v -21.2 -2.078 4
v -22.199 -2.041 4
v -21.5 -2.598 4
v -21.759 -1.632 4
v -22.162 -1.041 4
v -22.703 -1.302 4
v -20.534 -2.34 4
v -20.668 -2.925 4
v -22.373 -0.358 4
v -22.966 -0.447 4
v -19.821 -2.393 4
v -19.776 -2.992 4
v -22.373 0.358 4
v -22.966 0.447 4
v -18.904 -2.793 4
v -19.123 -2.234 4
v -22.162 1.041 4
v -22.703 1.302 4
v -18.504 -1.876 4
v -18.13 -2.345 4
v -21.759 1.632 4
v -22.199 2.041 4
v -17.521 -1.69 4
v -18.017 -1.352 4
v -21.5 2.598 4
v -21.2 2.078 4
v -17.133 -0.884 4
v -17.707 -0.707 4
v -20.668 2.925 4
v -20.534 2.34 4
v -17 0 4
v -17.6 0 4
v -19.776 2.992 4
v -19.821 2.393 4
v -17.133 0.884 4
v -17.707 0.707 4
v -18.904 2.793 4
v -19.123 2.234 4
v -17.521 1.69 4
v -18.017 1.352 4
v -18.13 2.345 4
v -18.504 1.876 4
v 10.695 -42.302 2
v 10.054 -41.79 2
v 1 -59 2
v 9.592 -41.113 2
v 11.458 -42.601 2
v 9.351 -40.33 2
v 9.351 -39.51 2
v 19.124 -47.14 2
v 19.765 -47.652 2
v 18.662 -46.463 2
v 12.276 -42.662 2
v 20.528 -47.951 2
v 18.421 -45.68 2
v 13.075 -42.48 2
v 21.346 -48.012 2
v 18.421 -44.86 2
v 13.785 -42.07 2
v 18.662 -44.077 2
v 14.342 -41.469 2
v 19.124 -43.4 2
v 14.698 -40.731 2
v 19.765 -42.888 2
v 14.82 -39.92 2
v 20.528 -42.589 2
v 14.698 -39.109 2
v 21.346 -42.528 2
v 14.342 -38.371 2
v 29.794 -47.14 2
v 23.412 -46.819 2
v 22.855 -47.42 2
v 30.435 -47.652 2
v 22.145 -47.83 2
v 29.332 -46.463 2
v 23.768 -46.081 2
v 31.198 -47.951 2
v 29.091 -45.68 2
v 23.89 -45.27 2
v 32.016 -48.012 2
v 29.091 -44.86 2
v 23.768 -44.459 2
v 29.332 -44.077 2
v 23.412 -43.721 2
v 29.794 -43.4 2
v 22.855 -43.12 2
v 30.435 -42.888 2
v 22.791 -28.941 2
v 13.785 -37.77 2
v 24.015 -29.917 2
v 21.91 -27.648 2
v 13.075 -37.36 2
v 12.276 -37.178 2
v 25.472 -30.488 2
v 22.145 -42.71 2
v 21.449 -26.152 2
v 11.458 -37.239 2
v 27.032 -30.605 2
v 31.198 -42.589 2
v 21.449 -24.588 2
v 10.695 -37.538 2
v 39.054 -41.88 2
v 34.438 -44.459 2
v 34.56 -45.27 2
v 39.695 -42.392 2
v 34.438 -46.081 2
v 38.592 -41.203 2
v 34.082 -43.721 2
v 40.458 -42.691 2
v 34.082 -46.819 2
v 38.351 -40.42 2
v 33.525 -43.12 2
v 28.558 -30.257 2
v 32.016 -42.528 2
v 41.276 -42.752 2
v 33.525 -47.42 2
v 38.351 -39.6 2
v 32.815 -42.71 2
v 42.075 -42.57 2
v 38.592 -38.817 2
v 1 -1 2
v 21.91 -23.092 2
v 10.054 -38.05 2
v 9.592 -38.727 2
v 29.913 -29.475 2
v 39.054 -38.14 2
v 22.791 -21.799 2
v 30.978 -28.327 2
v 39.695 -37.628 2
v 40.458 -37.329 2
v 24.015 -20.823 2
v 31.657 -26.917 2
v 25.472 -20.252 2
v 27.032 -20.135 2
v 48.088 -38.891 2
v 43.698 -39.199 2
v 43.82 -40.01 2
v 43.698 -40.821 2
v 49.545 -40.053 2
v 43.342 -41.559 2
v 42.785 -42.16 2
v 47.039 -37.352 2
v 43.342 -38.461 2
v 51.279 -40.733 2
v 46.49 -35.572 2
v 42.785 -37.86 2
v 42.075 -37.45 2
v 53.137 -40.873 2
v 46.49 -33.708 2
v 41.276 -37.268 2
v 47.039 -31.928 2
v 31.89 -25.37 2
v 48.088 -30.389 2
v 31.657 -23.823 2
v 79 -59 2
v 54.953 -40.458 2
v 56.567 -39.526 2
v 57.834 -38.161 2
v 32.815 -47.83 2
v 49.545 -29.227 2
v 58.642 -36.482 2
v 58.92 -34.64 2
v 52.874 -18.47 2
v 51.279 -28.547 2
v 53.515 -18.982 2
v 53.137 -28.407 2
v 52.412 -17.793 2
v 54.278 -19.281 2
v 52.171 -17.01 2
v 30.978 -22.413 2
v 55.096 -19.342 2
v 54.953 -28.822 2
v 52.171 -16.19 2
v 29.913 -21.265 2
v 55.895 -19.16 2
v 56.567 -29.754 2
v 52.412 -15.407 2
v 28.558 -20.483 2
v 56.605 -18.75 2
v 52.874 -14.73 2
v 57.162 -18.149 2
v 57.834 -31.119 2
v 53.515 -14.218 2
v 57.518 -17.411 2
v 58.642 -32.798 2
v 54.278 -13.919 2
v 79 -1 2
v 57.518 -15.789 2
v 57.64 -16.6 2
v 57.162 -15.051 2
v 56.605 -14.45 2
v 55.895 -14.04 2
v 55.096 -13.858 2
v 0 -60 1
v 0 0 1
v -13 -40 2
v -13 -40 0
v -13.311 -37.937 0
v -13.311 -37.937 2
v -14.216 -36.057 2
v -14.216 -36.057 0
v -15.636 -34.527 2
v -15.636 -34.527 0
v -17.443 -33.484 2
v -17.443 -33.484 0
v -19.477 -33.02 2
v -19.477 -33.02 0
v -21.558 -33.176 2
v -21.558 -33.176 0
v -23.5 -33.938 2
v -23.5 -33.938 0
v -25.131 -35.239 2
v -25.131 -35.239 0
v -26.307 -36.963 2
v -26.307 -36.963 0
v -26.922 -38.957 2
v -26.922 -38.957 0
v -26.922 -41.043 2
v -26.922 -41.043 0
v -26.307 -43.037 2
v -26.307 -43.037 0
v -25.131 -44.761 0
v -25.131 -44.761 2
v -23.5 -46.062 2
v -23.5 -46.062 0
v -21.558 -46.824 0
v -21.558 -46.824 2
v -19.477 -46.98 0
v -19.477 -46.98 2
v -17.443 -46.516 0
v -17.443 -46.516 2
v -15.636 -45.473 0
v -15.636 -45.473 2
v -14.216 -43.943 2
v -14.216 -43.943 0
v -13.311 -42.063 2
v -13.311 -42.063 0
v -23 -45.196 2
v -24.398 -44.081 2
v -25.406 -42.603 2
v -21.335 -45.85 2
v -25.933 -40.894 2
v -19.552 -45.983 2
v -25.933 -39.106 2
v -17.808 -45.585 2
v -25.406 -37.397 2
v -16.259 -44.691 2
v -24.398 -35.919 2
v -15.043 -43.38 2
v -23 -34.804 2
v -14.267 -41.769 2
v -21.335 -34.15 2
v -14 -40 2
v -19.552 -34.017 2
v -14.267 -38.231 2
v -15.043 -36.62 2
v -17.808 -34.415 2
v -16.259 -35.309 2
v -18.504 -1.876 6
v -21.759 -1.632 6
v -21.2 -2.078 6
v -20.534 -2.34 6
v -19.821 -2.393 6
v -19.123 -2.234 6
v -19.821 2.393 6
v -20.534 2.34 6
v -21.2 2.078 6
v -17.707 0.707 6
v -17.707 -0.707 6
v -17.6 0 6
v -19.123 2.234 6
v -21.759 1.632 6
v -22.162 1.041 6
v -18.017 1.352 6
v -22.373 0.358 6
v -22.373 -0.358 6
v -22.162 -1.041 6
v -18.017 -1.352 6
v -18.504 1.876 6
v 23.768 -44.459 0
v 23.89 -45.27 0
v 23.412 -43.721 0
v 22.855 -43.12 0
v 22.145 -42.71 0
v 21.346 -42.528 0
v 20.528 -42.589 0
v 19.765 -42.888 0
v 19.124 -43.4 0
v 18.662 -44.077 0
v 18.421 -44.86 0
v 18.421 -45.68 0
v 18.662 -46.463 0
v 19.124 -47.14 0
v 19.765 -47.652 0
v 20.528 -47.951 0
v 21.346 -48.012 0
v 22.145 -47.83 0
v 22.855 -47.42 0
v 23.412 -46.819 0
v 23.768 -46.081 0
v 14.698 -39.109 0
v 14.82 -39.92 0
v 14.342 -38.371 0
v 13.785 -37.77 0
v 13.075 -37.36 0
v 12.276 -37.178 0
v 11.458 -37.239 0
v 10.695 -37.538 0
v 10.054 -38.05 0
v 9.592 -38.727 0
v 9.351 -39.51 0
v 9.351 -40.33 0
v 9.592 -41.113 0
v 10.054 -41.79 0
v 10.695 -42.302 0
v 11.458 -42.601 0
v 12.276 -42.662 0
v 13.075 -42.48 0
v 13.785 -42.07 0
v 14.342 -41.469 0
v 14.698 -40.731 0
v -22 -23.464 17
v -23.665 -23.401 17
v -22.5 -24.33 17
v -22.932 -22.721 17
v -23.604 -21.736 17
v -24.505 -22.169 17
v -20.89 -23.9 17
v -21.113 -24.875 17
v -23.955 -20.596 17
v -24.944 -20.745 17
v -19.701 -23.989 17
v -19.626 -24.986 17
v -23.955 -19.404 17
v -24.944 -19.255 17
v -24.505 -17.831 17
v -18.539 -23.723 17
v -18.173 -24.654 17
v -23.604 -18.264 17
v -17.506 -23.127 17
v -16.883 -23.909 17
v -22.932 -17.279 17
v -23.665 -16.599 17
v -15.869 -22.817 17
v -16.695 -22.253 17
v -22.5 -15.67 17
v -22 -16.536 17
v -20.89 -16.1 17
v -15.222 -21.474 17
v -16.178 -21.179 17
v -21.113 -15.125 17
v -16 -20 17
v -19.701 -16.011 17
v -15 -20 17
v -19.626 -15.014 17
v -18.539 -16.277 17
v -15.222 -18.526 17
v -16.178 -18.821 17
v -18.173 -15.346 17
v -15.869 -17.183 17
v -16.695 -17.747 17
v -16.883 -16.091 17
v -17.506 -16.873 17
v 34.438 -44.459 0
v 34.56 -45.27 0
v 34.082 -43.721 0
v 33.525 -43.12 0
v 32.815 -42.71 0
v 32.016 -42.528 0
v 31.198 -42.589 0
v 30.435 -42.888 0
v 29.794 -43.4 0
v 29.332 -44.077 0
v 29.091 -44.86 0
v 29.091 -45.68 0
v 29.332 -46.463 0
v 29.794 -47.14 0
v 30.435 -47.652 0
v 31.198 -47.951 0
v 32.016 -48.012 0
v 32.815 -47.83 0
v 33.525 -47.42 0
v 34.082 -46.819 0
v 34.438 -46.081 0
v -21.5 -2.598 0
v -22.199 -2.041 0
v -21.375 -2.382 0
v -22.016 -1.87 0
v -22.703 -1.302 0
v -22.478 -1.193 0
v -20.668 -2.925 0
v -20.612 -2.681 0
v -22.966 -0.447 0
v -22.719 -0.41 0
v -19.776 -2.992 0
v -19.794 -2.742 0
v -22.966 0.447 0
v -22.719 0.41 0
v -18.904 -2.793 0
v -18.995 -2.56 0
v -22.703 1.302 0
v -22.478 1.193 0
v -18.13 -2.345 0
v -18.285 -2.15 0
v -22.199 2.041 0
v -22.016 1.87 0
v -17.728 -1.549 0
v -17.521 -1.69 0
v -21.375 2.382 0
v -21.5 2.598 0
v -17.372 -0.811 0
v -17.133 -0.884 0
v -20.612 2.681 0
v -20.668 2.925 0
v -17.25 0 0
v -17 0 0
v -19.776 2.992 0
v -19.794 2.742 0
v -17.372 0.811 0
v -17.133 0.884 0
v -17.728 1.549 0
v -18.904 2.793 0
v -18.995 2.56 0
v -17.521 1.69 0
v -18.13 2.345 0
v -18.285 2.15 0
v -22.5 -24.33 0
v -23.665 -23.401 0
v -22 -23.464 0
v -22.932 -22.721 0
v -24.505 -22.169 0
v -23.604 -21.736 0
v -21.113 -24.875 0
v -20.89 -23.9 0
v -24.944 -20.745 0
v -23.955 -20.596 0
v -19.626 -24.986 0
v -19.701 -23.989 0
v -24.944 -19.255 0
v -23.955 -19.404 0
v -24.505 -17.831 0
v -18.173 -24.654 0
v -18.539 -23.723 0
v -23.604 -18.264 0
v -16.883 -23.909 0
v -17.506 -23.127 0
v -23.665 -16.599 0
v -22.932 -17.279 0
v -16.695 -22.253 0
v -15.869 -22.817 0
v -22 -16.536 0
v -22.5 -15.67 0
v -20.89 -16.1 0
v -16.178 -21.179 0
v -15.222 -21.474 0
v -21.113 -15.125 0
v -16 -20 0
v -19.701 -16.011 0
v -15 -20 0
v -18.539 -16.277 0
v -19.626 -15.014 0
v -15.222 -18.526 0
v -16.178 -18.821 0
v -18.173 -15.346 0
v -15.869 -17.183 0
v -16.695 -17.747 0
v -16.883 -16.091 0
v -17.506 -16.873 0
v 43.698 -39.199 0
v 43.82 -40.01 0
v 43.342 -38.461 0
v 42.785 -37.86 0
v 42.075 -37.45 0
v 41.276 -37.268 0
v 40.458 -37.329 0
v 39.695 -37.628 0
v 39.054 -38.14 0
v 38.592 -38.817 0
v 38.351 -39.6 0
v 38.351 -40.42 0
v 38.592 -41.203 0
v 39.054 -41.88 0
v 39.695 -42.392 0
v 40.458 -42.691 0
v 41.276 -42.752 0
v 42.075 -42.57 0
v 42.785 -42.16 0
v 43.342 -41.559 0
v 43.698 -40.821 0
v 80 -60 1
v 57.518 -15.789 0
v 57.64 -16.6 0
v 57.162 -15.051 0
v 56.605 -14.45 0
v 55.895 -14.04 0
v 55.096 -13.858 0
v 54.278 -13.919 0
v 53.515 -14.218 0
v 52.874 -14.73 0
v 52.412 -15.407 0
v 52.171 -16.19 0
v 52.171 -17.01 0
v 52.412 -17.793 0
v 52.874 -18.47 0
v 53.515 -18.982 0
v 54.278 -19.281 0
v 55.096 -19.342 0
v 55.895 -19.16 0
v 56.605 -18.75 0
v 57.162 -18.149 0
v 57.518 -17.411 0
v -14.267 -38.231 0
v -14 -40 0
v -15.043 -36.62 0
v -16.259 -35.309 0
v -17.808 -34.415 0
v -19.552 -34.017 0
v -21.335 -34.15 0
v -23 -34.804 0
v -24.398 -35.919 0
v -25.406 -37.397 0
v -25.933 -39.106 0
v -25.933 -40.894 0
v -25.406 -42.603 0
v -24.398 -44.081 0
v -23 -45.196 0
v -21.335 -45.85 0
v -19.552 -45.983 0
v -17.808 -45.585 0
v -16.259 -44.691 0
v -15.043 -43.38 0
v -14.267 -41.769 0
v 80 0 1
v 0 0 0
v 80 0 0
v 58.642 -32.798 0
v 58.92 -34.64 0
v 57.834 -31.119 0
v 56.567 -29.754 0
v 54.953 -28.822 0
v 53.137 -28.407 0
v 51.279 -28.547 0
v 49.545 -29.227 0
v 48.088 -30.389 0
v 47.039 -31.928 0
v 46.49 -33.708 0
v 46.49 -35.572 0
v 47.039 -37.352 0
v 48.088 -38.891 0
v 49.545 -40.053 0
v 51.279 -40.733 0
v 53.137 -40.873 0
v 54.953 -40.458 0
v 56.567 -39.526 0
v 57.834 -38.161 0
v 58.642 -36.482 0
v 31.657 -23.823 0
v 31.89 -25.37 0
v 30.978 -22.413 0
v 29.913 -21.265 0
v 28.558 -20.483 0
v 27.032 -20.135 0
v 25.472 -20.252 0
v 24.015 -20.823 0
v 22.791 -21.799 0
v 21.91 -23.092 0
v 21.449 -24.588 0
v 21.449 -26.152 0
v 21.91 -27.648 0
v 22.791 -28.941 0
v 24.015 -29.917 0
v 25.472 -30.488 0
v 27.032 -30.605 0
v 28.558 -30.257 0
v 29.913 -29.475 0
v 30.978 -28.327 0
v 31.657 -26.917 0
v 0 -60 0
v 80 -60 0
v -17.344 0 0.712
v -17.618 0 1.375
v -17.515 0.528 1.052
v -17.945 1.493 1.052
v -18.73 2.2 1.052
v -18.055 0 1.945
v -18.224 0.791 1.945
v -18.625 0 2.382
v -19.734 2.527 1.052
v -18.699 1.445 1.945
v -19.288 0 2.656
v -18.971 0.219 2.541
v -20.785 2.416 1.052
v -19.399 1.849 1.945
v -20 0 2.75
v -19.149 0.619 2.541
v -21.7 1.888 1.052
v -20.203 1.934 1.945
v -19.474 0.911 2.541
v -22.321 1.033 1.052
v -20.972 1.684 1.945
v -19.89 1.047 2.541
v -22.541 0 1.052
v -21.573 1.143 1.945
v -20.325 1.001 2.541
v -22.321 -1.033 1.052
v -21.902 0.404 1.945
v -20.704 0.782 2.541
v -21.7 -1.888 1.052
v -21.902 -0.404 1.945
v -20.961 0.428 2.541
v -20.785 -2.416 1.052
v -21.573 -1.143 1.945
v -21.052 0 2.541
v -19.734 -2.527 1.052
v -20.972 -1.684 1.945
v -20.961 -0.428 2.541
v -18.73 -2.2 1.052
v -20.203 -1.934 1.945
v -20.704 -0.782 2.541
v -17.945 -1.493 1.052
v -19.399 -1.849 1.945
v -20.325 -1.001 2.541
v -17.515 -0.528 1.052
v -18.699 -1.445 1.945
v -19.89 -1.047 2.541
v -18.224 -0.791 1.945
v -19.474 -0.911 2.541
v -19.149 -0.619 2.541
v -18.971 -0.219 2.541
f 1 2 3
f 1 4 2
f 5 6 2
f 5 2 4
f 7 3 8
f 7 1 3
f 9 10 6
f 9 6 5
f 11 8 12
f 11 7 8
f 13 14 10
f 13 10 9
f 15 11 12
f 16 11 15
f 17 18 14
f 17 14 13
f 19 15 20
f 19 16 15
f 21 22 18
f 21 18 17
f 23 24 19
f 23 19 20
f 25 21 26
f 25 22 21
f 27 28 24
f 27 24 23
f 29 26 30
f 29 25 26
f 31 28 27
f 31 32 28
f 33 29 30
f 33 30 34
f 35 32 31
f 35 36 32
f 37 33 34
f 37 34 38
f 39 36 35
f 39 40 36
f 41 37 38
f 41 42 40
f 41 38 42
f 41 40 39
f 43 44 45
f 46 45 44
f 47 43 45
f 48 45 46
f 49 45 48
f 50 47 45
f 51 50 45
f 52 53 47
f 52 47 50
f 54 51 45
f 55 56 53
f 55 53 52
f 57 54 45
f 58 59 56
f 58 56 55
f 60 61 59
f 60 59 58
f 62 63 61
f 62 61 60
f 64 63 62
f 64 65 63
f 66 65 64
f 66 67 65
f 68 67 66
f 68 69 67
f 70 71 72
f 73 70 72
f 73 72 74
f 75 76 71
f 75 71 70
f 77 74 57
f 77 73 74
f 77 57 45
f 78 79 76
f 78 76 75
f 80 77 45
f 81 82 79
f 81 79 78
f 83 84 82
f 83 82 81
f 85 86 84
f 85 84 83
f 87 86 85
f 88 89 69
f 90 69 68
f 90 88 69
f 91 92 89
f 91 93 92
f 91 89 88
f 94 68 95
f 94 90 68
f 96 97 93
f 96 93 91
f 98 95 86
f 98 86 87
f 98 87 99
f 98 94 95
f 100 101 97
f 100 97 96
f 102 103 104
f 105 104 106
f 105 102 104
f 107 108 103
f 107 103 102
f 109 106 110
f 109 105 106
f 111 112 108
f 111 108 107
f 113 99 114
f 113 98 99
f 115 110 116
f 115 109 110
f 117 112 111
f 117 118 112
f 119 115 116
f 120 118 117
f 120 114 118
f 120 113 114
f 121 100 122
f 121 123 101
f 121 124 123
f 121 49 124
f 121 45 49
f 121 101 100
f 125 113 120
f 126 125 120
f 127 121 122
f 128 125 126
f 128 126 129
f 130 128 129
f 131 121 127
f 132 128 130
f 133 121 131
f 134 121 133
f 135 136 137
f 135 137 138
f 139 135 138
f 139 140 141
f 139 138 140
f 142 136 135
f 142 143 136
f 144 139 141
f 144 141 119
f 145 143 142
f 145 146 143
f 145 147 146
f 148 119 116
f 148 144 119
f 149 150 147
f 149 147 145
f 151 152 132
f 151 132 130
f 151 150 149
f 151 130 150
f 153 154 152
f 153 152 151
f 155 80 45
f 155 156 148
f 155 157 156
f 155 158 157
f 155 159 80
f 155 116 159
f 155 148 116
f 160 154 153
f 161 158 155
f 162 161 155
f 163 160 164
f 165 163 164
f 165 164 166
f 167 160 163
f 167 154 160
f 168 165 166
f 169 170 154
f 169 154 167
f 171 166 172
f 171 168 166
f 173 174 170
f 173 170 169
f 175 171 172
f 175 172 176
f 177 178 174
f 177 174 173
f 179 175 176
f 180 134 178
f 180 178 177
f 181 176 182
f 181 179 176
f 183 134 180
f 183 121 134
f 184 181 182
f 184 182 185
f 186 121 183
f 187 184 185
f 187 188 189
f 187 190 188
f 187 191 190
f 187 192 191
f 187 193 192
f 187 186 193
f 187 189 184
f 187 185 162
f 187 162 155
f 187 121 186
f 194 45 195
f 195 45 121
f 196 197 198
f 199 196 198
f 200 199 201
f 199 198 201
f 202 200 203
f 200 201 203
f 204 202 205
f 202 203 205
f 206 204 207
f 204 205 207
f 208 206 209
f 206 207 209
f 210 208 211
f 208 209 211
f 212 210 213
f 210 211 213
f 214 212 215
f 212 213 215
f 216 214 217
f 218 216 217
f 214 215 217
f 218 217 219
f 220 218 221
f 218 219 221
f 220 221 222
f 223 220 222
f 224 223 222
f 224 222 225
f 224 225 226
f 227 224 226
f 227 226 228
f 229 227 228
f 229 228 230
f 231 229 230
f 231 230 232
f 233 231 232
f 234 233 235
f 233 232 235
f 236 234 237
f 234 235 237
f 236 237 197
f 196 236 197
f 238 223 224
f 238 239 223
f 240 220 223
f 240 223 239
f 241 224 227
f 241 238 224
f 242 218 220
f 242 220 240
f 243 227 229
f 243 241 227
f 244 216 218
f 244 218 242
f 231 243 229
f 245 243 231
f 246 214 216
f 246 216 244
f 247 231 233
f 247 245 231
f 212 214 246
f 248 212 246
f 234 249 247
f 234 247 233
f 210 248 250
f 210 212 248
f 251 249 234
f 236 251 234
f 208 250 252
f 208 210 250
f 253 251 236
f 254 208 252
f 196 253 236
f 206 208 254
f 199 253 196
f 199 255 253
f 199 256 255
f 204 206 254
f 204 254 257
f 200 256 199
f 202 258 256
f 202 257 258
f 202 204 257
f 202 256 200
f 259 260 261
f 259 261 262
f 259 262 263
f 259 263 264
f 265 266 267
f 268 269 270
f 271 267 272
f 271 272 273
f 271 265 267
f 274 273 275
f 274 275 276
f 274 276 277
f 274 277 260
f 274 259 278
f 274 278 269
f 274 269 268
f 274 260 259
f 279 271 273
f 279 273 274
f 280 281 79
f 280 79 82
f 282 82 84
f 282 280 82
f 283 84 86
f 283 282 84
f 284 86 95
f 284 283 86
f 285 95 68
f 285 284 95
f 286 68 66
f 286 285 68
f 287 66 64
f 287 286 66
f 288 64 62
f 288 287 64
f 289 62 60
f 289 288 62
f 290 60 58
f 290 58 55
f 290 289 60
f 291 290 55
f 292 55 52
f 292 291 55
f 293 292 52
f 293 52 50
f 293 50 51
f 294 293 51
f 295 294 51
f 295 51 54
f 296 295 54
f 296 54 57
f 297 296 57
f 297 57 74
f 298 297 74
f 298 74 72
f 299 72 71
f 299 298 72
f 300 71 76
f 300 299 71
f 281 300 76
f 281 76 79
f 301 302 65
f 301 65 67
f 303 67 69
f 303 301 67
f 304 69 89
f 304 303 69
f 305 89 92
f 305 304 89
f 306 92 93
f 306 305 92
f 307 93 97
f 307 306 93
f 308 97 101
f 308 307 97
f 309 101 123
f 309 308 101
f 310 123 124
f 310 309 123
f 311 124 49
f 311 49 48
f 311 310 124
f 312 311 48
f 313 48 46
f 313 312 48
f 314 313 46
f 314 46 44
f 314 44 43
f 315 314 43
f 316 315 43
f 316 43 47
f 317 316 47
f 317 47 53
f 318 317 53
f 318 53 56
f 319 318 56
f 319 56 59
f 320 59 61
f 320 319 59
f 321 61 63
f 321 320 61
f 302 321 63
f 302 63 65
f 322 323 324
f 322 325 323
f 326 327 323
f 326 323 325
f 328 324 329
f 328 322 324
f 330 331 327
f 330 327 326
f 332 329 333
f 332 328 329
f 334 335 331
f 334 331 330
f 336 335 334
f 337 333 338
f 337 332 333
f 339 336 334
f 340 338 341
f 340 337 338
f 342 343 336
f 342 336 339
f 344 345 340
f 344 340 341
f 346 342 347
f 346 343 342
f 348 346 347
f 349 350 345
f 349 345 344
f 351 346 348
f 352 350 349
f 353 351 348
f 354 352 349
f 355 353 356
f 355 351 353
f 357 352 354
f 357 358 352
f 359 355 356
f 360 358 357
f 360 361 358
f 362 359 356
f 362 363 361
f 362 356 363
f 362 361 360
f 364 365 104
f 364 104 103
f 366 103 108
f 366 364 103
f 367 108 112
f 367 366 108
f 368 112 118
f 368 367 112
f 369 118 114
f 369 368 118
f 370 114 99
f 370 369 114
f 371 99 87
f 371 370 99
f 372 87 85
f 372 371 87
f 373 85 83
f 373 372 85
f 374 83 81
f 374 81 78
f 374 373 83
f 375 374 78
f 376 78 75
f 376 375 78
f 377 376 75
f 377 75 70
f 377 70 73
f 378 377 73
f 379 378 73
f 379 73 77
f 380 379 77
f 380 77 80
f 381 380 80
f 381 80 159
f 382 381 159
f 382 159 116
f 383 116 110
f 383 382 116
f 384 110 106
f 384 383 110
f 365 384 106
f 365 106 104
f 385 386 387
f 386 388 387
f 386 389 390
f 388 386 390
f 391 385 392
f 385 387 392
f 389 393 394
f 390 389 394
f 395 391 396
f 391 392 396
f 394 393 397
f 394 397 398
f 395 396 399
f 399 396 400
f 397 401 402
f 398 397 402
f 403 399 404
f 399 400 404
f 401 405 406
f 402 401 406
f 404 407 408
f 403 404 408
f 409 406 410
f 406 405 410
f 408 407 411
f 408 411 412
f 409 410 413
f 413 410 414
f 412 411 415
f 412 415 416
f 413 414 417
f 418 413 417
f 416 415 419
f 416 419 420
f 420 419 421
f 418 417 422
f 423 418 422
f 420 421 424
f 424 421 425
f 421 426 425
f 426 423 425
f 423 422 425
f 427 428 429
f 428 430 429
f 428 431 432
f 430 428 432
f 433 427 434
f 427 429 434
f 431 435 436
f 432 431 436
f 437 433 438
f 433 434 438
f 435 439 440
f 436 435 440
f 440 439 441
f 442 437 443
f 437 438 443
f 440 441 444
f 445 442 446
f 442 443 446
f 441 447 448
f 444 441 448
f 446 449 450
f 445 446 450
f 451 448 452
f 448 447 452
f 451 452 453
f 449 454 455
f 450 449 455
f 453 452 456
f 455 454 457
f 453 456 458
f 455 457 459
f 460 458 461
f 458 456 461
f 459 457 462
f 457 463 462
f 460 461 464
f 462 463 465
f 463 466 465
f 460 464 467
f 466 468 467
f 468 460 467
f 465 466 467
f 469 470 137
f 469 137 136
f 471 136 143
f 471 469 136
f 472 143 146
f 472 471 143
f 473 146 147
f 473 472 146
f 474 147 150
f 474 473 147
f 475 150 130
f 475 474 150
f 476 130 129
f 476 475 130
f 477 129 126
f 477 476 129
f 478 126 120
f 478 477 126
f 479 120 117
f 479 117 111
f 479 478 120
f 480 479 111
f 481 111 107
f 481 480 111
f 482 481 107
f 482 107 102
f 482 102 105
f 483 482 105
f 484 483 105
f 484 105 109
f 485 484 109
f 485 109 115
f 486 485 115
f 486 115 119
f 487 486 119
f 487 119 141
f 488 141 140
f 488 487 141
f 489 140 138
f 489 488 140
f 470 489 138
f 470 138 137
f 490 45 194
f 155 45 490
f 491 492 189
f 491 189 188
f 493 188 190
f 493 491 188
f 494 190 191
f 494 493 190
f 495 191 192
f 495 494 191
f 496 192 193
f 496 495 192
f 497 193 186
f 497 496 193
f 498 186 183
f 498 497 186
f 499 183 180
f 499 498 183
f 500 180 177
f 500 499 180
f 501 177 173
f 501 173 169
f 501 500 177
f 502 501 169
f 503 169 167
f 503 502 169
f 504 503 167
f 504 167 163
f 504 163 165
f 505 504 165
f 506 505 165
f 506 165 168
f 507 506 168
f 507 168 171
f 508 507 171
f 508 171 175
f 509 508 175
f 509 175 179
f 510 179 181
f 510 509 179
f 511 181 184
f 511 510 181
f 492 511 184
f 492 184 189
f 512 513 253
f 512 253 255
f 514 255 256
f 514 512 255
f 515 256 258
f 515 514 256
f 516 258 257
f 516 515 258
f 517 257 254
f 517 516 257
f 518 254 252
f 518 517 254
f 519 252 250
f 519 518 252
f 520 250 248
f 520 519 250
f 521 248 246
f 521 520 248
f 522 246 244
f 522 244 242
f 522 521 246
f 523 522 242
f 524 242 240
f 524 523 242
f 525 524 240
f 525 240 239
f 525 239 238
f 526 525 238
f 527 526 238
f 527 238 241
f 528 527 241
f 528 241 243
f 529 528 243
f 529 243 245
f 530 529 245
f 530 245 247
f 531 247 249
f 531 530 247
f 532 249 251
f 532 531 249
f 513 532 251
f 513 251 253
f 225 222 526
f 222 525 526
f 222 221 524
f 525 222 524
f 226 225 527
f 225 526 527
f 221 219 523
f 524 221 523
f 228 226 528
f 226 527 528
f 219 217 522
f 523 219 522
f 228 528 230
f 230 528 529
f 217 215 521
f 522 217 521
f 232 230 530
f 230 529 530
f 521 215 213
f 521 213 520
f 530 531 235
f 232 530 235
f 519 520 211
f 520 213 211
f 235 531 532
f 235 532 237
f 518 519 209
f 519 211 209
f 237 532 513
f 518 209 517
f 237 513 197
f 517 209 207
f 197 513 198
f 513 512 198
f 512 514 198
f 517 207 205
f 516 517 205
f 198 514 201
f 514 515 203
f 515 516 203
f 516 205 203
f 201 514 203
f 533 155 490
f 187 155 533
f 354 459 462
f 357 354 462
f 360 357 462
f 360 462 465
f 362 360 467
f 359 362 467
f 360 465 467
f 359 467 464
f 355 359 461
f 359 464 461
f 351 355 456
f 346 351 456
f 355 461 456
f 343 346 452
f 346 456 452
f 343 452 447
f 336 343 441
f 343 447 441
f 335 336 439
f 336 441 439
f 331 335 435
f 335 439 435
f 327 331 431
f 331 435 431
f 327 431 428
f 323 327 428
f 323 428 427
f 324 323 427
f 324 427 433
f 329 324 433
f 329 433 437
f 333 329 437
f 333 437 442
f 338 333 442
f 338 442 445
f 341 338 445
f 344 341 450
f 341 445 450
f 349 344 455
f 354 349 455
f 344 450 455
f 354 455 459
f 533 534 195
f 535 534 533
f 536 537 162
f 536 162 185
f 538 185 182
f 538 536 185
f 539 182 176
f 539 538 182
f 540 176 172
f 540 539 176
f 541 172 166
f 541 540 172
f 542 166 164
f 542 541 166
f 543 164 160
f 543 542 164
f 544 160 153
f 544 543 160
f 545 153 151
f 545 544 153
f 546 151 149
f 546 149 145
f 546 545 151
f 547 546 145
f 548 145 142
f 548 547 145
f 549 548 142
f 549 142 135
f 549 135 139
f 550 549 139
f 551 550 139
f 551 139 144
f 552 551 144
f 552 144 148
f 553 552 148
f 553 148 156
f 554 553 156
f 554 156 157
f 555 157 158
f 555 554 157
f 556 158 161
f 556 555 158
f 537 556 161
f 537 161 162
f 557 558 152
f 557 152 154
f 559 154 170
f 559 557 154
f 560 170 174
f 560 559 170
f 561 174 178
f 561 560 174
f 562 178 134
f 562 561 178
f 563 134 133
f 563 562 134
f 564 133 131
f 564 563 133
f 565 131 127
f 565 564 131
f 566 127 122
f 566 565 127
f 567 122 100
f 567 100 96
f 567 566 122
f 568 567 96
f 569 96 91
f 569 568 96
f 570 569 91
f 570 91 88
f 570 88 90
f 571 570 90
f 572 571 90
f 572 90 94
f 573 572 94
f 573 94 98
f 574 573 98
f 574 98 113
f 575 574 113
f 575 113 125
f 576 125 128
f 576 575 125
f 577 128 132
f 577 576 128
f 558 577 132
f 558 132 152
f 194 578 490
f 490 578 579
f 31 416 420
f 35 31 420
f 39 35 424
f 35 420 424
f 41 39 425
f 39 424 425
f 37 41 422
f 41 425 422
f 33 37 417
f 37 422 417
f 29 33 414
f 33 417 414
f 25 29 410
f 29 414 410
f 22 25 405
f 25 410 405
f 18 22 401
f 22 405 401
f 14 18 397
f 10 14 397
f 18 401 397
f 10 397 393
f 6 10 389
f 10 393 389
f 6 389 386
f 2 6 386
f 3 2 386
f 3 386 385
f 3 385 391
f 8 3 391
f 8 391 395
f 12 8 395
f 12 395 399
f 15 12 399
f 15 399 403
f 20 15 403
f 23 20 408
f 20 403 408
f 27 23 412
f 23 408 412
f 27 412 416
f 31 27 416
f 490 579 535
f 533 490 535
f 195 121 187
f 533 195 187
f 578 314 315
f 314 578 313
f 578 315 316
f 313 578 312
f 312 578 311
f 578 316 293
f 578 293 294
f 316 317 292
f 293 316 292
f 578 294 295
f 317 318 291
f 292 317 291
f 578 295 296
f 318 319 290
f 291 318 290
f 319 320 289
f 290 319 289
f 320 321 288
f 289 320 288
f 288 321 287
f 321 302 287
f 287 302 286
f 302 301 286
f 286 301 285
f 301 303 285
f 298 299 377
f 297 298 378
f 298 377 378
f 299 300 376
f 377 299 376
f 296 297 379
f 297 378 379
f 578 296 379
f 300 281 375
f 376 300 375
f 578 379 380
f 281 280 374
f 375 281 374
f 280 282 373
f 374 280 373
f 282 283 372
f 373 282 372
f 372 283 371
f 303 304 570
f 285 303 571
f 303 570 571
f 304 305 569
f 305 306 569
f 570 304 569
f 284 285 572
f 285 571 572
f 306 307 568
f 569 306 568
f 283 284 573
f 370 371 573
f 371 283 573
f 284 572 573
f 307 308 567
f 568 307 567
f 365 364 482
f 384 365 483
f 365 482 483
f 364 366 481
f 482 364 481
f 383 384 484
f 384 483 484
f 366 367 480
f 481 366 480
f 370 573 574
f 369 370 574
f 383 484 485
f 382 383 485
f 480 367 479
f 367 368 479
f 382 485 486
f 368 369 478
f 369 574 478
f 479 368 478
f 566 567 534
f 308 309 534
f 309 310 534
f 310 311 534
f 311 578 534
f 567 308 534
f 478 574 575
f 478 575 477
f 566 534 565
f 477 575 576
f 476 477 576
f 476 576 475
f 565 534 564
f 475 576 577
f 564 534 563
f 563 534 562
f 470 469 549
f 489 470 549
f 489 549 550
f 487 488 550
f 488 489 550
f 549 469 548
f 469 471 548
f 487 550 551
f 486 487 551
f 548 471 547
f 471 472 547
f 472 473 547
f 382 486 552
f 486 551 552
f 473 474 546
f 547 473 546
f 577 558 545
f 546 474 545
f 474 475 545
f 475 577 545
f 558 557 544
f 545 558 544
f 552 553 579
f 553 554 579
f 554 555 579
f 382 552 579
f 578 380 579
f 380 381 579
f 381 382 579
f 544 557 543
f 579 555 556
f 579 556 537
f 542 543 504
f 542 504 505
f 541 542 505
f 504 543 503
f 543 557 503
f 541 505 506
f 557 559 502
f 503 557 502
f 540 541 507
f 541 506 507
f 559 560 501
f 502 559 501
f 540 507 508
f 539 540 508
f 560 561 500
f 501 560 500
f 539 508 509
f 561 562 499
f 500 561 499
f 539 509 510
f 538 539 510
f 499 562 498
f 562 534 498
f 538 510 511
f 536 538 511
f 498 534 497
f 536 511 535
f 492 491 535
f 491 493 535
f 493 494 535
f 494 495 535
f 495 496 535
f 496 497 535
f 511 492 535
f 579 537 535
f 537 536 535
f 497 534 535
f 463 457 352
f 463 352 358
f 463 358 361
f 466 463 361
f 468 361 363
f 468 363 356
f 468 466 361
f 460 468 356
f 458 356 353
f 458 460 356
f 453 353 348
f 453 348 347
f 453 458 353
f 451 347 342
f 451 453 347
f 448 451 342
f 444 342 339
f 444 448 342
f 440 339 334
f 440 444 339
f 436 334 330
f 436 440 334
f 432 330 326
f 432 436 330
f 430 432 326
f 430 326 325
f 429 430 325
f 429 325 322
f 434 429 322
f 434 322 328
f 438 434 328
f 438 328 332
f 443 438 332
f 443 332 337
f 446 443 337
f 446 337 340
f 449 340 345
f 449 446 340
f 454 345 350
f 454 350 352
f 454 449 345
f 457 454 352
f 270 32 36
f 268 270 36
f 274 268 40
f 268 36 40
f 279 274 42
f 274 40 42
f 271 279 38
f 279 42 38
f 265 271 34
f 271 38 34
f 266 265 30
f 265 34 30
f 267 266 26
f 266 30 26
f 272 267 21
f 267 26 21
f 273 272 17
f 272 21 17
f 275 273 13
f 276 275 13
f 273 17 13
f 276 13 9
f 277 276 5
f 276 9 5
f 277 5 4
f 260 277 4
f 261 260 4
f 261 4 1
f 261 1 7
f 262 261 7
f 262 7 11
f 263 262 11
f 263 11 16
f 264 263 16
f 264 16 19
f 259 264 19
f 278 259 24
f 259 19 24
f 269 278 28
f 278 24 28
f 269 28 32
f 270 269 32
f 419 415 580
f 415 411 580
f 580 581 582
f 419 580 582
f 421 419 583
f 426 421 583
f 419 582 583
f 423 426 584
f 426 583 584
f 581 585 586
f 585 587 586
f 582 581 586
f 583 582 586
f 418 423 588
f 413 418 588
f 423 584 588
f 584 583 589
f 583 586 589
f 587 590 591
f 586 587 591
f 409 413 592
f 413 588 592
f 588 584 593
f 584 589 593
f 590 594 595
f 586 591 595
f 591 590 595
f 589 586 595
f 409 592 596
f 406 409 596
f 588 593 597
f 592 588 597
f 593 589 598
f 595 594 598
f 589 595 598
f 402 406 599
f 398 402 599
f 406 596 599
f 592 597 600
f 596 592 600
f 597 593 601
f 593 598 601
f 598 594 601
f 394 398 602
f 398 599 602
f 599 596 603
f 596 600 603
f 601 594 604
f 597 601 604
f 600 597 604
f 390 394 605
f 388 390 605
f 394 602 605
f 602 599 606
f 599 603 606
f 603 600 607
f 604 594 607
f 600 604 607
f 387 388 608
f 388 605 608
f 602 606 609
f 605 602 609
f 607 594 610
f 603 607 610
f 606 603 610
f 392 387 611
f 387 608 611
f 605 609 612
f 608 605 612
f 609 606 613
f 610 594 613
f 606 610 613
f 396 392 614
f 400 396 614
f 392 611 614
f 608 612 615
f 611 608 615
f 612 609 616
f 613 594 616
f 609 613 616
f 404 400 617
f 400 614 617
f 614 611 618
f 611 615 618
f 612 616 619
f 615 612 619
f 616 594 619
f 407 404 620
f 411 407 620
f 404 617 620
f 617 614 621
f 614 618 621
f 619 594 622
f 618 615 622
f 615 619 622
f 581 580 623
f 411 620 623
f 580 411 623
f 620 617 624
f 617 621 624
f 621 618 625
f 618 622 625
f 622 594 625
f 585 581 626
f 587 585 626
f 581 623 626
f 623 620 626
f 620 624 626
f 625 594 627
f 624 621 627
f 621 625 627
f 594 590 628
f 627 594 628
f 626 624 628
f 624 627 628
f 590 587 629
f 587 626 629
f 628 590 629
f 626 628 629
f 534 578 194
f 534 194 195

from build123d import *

# Parameters (mm, degrees)
SKETCH_W          = 80
SKETCH_H          = 60
SKETCH_R          = 5.25
SKETCH_R_2        = 2.75
SKETCH_R_3        = 6.25
EXTRUDE_DEPTH     = 2
CHAMFER_SIZE      = 1
CYLINDER001_R     = 2.4
CYLINDER001_DEPTH = 2
CYLINDER_R        = 3
CYLINDER_DEPTH    = 4
TUBE_R            = 5
TUBE_R_2          = 4
TUBE_DEPTH        = 17
TUBE001_R         = 7
TUBE001_R_2       = 6
TUBE001_DEPTH     = 2


with BuildPart() as panel:
    # Sketch → Extrude (new body)
    with BuildSketch(Plane.XY):
        with Locations((40, -30)):
            Rectangle(SKETCH_W, SKETCH_H)
        with Locations((26.64, -25.37)):
            Circle(SKETCH_R, mode=Mode.SUBTRACT)
        with Locations((12.07, -39.92)):
            Circle(SKETCH_R_2, mode=Mode.SUBTRACT)
        with Locations((21.14, -45.27)):
            Circle(SKETCH_R_2, mode=Mode.SUBTRACT)
        with Locations((31.81, -45.27)):
            Circle(SKETCH_R_2, mode=Mode.SUBTRACT)
        with Locations((41.07, -40.01)):
            Circle(SKETCH_R_2, mode=Mode.SUBTRACT)
        with Locations((54.89, -16.6)):
            Circle(SKETCH_R_2, mode=Mode.SUBTRACT)
        with Locations((52.67, -34.64)):
            Circle(SKETCH_R_3, mode=Mode.SUBTRACT)
    extrude(amount=EXTRUDE_DEPTH)

    # Chamfer
    chamfer_edges = [panel.edges().sort_by_distance(p)[0] for p in [
        (40, 0, 2),
        (80, -30, 2),
        (40, -60, 2),
        (0, -30, 2),
    ]]
    chamfer(chamfer_edges, length=CHAMFER_SIZE)


with BuildPart() as cylinder001:
    # Cylinder001 → Cylinder001 (new body)
    with BuildSketch(Plane(origin=(-20, 0, 4), x_dir=(1, 0, 0), z_dir=(0, 0, 1))):
        Circle(CYLINDER001_R)
    extrude(amount=CYLINDER001_DEPTH)


with BuildPart() as sphere:
    # Sphere → Sphere (revolve)
    with BuildSketch(Plane(origin=(-20, 0, 0), x_dir=(1, 0, 0), z_dir=(0, -1, 0))):
        with BuildLine():
            ThreePointArc((0, -2.75), (2.75, 0), (0, 2.75))
            Line((0, 2.75), (0, -2.75))
        make_face()
    revolve(axis=Axis((-20, 0, 0), (0, 0, 1)))


with BuildPart() as lightpipe:
    # Cylinder → Cylinder (new body)
    with BuildSketch(Plane(origin=(-20, 0, 0), x_dir=(1, 0, 0), z_dir=(0, 0, 1))):
        Circle(CYLINDER_R)
    extrude(amount=CYLINDER_DEPTH)

    # Cut: cut Sphere
    add(sphere.part, mode=Mode.SUBTRACT)

    # Fusion: union Cylinder001
    add(cylinder001.part)


with BuildPart() as shroud:
    # Tube → Tube (new body)
    with BuildSketch(Plane(origin=(-20, -20, 0), x_dir=(1, 0, 0), z_dir=(0, 0, 1))):
        Circle(TUBE_R)
        Circle(TUBE_R_2, mode=Mode.SUBTRACT)
    extrude(amount=TUBE_DEPTH)


with BuildPart() as shim:
    # Tube001 → Tube001 (new body)
    with BuildSketch(Plane(origin=(-20, -40, 0), x_dir=(1, 0, 0), z_dir=(0, 0, 1))):
        Circle(TUBE001_R)
        Circle(TUBE001_R_2, mode=Mode.SUBTRACT)
    extrude(amount=TUBE001_DEPTH)


solid = Compound([panel.part, lightpipe.part, shroud.part, shim.part])
